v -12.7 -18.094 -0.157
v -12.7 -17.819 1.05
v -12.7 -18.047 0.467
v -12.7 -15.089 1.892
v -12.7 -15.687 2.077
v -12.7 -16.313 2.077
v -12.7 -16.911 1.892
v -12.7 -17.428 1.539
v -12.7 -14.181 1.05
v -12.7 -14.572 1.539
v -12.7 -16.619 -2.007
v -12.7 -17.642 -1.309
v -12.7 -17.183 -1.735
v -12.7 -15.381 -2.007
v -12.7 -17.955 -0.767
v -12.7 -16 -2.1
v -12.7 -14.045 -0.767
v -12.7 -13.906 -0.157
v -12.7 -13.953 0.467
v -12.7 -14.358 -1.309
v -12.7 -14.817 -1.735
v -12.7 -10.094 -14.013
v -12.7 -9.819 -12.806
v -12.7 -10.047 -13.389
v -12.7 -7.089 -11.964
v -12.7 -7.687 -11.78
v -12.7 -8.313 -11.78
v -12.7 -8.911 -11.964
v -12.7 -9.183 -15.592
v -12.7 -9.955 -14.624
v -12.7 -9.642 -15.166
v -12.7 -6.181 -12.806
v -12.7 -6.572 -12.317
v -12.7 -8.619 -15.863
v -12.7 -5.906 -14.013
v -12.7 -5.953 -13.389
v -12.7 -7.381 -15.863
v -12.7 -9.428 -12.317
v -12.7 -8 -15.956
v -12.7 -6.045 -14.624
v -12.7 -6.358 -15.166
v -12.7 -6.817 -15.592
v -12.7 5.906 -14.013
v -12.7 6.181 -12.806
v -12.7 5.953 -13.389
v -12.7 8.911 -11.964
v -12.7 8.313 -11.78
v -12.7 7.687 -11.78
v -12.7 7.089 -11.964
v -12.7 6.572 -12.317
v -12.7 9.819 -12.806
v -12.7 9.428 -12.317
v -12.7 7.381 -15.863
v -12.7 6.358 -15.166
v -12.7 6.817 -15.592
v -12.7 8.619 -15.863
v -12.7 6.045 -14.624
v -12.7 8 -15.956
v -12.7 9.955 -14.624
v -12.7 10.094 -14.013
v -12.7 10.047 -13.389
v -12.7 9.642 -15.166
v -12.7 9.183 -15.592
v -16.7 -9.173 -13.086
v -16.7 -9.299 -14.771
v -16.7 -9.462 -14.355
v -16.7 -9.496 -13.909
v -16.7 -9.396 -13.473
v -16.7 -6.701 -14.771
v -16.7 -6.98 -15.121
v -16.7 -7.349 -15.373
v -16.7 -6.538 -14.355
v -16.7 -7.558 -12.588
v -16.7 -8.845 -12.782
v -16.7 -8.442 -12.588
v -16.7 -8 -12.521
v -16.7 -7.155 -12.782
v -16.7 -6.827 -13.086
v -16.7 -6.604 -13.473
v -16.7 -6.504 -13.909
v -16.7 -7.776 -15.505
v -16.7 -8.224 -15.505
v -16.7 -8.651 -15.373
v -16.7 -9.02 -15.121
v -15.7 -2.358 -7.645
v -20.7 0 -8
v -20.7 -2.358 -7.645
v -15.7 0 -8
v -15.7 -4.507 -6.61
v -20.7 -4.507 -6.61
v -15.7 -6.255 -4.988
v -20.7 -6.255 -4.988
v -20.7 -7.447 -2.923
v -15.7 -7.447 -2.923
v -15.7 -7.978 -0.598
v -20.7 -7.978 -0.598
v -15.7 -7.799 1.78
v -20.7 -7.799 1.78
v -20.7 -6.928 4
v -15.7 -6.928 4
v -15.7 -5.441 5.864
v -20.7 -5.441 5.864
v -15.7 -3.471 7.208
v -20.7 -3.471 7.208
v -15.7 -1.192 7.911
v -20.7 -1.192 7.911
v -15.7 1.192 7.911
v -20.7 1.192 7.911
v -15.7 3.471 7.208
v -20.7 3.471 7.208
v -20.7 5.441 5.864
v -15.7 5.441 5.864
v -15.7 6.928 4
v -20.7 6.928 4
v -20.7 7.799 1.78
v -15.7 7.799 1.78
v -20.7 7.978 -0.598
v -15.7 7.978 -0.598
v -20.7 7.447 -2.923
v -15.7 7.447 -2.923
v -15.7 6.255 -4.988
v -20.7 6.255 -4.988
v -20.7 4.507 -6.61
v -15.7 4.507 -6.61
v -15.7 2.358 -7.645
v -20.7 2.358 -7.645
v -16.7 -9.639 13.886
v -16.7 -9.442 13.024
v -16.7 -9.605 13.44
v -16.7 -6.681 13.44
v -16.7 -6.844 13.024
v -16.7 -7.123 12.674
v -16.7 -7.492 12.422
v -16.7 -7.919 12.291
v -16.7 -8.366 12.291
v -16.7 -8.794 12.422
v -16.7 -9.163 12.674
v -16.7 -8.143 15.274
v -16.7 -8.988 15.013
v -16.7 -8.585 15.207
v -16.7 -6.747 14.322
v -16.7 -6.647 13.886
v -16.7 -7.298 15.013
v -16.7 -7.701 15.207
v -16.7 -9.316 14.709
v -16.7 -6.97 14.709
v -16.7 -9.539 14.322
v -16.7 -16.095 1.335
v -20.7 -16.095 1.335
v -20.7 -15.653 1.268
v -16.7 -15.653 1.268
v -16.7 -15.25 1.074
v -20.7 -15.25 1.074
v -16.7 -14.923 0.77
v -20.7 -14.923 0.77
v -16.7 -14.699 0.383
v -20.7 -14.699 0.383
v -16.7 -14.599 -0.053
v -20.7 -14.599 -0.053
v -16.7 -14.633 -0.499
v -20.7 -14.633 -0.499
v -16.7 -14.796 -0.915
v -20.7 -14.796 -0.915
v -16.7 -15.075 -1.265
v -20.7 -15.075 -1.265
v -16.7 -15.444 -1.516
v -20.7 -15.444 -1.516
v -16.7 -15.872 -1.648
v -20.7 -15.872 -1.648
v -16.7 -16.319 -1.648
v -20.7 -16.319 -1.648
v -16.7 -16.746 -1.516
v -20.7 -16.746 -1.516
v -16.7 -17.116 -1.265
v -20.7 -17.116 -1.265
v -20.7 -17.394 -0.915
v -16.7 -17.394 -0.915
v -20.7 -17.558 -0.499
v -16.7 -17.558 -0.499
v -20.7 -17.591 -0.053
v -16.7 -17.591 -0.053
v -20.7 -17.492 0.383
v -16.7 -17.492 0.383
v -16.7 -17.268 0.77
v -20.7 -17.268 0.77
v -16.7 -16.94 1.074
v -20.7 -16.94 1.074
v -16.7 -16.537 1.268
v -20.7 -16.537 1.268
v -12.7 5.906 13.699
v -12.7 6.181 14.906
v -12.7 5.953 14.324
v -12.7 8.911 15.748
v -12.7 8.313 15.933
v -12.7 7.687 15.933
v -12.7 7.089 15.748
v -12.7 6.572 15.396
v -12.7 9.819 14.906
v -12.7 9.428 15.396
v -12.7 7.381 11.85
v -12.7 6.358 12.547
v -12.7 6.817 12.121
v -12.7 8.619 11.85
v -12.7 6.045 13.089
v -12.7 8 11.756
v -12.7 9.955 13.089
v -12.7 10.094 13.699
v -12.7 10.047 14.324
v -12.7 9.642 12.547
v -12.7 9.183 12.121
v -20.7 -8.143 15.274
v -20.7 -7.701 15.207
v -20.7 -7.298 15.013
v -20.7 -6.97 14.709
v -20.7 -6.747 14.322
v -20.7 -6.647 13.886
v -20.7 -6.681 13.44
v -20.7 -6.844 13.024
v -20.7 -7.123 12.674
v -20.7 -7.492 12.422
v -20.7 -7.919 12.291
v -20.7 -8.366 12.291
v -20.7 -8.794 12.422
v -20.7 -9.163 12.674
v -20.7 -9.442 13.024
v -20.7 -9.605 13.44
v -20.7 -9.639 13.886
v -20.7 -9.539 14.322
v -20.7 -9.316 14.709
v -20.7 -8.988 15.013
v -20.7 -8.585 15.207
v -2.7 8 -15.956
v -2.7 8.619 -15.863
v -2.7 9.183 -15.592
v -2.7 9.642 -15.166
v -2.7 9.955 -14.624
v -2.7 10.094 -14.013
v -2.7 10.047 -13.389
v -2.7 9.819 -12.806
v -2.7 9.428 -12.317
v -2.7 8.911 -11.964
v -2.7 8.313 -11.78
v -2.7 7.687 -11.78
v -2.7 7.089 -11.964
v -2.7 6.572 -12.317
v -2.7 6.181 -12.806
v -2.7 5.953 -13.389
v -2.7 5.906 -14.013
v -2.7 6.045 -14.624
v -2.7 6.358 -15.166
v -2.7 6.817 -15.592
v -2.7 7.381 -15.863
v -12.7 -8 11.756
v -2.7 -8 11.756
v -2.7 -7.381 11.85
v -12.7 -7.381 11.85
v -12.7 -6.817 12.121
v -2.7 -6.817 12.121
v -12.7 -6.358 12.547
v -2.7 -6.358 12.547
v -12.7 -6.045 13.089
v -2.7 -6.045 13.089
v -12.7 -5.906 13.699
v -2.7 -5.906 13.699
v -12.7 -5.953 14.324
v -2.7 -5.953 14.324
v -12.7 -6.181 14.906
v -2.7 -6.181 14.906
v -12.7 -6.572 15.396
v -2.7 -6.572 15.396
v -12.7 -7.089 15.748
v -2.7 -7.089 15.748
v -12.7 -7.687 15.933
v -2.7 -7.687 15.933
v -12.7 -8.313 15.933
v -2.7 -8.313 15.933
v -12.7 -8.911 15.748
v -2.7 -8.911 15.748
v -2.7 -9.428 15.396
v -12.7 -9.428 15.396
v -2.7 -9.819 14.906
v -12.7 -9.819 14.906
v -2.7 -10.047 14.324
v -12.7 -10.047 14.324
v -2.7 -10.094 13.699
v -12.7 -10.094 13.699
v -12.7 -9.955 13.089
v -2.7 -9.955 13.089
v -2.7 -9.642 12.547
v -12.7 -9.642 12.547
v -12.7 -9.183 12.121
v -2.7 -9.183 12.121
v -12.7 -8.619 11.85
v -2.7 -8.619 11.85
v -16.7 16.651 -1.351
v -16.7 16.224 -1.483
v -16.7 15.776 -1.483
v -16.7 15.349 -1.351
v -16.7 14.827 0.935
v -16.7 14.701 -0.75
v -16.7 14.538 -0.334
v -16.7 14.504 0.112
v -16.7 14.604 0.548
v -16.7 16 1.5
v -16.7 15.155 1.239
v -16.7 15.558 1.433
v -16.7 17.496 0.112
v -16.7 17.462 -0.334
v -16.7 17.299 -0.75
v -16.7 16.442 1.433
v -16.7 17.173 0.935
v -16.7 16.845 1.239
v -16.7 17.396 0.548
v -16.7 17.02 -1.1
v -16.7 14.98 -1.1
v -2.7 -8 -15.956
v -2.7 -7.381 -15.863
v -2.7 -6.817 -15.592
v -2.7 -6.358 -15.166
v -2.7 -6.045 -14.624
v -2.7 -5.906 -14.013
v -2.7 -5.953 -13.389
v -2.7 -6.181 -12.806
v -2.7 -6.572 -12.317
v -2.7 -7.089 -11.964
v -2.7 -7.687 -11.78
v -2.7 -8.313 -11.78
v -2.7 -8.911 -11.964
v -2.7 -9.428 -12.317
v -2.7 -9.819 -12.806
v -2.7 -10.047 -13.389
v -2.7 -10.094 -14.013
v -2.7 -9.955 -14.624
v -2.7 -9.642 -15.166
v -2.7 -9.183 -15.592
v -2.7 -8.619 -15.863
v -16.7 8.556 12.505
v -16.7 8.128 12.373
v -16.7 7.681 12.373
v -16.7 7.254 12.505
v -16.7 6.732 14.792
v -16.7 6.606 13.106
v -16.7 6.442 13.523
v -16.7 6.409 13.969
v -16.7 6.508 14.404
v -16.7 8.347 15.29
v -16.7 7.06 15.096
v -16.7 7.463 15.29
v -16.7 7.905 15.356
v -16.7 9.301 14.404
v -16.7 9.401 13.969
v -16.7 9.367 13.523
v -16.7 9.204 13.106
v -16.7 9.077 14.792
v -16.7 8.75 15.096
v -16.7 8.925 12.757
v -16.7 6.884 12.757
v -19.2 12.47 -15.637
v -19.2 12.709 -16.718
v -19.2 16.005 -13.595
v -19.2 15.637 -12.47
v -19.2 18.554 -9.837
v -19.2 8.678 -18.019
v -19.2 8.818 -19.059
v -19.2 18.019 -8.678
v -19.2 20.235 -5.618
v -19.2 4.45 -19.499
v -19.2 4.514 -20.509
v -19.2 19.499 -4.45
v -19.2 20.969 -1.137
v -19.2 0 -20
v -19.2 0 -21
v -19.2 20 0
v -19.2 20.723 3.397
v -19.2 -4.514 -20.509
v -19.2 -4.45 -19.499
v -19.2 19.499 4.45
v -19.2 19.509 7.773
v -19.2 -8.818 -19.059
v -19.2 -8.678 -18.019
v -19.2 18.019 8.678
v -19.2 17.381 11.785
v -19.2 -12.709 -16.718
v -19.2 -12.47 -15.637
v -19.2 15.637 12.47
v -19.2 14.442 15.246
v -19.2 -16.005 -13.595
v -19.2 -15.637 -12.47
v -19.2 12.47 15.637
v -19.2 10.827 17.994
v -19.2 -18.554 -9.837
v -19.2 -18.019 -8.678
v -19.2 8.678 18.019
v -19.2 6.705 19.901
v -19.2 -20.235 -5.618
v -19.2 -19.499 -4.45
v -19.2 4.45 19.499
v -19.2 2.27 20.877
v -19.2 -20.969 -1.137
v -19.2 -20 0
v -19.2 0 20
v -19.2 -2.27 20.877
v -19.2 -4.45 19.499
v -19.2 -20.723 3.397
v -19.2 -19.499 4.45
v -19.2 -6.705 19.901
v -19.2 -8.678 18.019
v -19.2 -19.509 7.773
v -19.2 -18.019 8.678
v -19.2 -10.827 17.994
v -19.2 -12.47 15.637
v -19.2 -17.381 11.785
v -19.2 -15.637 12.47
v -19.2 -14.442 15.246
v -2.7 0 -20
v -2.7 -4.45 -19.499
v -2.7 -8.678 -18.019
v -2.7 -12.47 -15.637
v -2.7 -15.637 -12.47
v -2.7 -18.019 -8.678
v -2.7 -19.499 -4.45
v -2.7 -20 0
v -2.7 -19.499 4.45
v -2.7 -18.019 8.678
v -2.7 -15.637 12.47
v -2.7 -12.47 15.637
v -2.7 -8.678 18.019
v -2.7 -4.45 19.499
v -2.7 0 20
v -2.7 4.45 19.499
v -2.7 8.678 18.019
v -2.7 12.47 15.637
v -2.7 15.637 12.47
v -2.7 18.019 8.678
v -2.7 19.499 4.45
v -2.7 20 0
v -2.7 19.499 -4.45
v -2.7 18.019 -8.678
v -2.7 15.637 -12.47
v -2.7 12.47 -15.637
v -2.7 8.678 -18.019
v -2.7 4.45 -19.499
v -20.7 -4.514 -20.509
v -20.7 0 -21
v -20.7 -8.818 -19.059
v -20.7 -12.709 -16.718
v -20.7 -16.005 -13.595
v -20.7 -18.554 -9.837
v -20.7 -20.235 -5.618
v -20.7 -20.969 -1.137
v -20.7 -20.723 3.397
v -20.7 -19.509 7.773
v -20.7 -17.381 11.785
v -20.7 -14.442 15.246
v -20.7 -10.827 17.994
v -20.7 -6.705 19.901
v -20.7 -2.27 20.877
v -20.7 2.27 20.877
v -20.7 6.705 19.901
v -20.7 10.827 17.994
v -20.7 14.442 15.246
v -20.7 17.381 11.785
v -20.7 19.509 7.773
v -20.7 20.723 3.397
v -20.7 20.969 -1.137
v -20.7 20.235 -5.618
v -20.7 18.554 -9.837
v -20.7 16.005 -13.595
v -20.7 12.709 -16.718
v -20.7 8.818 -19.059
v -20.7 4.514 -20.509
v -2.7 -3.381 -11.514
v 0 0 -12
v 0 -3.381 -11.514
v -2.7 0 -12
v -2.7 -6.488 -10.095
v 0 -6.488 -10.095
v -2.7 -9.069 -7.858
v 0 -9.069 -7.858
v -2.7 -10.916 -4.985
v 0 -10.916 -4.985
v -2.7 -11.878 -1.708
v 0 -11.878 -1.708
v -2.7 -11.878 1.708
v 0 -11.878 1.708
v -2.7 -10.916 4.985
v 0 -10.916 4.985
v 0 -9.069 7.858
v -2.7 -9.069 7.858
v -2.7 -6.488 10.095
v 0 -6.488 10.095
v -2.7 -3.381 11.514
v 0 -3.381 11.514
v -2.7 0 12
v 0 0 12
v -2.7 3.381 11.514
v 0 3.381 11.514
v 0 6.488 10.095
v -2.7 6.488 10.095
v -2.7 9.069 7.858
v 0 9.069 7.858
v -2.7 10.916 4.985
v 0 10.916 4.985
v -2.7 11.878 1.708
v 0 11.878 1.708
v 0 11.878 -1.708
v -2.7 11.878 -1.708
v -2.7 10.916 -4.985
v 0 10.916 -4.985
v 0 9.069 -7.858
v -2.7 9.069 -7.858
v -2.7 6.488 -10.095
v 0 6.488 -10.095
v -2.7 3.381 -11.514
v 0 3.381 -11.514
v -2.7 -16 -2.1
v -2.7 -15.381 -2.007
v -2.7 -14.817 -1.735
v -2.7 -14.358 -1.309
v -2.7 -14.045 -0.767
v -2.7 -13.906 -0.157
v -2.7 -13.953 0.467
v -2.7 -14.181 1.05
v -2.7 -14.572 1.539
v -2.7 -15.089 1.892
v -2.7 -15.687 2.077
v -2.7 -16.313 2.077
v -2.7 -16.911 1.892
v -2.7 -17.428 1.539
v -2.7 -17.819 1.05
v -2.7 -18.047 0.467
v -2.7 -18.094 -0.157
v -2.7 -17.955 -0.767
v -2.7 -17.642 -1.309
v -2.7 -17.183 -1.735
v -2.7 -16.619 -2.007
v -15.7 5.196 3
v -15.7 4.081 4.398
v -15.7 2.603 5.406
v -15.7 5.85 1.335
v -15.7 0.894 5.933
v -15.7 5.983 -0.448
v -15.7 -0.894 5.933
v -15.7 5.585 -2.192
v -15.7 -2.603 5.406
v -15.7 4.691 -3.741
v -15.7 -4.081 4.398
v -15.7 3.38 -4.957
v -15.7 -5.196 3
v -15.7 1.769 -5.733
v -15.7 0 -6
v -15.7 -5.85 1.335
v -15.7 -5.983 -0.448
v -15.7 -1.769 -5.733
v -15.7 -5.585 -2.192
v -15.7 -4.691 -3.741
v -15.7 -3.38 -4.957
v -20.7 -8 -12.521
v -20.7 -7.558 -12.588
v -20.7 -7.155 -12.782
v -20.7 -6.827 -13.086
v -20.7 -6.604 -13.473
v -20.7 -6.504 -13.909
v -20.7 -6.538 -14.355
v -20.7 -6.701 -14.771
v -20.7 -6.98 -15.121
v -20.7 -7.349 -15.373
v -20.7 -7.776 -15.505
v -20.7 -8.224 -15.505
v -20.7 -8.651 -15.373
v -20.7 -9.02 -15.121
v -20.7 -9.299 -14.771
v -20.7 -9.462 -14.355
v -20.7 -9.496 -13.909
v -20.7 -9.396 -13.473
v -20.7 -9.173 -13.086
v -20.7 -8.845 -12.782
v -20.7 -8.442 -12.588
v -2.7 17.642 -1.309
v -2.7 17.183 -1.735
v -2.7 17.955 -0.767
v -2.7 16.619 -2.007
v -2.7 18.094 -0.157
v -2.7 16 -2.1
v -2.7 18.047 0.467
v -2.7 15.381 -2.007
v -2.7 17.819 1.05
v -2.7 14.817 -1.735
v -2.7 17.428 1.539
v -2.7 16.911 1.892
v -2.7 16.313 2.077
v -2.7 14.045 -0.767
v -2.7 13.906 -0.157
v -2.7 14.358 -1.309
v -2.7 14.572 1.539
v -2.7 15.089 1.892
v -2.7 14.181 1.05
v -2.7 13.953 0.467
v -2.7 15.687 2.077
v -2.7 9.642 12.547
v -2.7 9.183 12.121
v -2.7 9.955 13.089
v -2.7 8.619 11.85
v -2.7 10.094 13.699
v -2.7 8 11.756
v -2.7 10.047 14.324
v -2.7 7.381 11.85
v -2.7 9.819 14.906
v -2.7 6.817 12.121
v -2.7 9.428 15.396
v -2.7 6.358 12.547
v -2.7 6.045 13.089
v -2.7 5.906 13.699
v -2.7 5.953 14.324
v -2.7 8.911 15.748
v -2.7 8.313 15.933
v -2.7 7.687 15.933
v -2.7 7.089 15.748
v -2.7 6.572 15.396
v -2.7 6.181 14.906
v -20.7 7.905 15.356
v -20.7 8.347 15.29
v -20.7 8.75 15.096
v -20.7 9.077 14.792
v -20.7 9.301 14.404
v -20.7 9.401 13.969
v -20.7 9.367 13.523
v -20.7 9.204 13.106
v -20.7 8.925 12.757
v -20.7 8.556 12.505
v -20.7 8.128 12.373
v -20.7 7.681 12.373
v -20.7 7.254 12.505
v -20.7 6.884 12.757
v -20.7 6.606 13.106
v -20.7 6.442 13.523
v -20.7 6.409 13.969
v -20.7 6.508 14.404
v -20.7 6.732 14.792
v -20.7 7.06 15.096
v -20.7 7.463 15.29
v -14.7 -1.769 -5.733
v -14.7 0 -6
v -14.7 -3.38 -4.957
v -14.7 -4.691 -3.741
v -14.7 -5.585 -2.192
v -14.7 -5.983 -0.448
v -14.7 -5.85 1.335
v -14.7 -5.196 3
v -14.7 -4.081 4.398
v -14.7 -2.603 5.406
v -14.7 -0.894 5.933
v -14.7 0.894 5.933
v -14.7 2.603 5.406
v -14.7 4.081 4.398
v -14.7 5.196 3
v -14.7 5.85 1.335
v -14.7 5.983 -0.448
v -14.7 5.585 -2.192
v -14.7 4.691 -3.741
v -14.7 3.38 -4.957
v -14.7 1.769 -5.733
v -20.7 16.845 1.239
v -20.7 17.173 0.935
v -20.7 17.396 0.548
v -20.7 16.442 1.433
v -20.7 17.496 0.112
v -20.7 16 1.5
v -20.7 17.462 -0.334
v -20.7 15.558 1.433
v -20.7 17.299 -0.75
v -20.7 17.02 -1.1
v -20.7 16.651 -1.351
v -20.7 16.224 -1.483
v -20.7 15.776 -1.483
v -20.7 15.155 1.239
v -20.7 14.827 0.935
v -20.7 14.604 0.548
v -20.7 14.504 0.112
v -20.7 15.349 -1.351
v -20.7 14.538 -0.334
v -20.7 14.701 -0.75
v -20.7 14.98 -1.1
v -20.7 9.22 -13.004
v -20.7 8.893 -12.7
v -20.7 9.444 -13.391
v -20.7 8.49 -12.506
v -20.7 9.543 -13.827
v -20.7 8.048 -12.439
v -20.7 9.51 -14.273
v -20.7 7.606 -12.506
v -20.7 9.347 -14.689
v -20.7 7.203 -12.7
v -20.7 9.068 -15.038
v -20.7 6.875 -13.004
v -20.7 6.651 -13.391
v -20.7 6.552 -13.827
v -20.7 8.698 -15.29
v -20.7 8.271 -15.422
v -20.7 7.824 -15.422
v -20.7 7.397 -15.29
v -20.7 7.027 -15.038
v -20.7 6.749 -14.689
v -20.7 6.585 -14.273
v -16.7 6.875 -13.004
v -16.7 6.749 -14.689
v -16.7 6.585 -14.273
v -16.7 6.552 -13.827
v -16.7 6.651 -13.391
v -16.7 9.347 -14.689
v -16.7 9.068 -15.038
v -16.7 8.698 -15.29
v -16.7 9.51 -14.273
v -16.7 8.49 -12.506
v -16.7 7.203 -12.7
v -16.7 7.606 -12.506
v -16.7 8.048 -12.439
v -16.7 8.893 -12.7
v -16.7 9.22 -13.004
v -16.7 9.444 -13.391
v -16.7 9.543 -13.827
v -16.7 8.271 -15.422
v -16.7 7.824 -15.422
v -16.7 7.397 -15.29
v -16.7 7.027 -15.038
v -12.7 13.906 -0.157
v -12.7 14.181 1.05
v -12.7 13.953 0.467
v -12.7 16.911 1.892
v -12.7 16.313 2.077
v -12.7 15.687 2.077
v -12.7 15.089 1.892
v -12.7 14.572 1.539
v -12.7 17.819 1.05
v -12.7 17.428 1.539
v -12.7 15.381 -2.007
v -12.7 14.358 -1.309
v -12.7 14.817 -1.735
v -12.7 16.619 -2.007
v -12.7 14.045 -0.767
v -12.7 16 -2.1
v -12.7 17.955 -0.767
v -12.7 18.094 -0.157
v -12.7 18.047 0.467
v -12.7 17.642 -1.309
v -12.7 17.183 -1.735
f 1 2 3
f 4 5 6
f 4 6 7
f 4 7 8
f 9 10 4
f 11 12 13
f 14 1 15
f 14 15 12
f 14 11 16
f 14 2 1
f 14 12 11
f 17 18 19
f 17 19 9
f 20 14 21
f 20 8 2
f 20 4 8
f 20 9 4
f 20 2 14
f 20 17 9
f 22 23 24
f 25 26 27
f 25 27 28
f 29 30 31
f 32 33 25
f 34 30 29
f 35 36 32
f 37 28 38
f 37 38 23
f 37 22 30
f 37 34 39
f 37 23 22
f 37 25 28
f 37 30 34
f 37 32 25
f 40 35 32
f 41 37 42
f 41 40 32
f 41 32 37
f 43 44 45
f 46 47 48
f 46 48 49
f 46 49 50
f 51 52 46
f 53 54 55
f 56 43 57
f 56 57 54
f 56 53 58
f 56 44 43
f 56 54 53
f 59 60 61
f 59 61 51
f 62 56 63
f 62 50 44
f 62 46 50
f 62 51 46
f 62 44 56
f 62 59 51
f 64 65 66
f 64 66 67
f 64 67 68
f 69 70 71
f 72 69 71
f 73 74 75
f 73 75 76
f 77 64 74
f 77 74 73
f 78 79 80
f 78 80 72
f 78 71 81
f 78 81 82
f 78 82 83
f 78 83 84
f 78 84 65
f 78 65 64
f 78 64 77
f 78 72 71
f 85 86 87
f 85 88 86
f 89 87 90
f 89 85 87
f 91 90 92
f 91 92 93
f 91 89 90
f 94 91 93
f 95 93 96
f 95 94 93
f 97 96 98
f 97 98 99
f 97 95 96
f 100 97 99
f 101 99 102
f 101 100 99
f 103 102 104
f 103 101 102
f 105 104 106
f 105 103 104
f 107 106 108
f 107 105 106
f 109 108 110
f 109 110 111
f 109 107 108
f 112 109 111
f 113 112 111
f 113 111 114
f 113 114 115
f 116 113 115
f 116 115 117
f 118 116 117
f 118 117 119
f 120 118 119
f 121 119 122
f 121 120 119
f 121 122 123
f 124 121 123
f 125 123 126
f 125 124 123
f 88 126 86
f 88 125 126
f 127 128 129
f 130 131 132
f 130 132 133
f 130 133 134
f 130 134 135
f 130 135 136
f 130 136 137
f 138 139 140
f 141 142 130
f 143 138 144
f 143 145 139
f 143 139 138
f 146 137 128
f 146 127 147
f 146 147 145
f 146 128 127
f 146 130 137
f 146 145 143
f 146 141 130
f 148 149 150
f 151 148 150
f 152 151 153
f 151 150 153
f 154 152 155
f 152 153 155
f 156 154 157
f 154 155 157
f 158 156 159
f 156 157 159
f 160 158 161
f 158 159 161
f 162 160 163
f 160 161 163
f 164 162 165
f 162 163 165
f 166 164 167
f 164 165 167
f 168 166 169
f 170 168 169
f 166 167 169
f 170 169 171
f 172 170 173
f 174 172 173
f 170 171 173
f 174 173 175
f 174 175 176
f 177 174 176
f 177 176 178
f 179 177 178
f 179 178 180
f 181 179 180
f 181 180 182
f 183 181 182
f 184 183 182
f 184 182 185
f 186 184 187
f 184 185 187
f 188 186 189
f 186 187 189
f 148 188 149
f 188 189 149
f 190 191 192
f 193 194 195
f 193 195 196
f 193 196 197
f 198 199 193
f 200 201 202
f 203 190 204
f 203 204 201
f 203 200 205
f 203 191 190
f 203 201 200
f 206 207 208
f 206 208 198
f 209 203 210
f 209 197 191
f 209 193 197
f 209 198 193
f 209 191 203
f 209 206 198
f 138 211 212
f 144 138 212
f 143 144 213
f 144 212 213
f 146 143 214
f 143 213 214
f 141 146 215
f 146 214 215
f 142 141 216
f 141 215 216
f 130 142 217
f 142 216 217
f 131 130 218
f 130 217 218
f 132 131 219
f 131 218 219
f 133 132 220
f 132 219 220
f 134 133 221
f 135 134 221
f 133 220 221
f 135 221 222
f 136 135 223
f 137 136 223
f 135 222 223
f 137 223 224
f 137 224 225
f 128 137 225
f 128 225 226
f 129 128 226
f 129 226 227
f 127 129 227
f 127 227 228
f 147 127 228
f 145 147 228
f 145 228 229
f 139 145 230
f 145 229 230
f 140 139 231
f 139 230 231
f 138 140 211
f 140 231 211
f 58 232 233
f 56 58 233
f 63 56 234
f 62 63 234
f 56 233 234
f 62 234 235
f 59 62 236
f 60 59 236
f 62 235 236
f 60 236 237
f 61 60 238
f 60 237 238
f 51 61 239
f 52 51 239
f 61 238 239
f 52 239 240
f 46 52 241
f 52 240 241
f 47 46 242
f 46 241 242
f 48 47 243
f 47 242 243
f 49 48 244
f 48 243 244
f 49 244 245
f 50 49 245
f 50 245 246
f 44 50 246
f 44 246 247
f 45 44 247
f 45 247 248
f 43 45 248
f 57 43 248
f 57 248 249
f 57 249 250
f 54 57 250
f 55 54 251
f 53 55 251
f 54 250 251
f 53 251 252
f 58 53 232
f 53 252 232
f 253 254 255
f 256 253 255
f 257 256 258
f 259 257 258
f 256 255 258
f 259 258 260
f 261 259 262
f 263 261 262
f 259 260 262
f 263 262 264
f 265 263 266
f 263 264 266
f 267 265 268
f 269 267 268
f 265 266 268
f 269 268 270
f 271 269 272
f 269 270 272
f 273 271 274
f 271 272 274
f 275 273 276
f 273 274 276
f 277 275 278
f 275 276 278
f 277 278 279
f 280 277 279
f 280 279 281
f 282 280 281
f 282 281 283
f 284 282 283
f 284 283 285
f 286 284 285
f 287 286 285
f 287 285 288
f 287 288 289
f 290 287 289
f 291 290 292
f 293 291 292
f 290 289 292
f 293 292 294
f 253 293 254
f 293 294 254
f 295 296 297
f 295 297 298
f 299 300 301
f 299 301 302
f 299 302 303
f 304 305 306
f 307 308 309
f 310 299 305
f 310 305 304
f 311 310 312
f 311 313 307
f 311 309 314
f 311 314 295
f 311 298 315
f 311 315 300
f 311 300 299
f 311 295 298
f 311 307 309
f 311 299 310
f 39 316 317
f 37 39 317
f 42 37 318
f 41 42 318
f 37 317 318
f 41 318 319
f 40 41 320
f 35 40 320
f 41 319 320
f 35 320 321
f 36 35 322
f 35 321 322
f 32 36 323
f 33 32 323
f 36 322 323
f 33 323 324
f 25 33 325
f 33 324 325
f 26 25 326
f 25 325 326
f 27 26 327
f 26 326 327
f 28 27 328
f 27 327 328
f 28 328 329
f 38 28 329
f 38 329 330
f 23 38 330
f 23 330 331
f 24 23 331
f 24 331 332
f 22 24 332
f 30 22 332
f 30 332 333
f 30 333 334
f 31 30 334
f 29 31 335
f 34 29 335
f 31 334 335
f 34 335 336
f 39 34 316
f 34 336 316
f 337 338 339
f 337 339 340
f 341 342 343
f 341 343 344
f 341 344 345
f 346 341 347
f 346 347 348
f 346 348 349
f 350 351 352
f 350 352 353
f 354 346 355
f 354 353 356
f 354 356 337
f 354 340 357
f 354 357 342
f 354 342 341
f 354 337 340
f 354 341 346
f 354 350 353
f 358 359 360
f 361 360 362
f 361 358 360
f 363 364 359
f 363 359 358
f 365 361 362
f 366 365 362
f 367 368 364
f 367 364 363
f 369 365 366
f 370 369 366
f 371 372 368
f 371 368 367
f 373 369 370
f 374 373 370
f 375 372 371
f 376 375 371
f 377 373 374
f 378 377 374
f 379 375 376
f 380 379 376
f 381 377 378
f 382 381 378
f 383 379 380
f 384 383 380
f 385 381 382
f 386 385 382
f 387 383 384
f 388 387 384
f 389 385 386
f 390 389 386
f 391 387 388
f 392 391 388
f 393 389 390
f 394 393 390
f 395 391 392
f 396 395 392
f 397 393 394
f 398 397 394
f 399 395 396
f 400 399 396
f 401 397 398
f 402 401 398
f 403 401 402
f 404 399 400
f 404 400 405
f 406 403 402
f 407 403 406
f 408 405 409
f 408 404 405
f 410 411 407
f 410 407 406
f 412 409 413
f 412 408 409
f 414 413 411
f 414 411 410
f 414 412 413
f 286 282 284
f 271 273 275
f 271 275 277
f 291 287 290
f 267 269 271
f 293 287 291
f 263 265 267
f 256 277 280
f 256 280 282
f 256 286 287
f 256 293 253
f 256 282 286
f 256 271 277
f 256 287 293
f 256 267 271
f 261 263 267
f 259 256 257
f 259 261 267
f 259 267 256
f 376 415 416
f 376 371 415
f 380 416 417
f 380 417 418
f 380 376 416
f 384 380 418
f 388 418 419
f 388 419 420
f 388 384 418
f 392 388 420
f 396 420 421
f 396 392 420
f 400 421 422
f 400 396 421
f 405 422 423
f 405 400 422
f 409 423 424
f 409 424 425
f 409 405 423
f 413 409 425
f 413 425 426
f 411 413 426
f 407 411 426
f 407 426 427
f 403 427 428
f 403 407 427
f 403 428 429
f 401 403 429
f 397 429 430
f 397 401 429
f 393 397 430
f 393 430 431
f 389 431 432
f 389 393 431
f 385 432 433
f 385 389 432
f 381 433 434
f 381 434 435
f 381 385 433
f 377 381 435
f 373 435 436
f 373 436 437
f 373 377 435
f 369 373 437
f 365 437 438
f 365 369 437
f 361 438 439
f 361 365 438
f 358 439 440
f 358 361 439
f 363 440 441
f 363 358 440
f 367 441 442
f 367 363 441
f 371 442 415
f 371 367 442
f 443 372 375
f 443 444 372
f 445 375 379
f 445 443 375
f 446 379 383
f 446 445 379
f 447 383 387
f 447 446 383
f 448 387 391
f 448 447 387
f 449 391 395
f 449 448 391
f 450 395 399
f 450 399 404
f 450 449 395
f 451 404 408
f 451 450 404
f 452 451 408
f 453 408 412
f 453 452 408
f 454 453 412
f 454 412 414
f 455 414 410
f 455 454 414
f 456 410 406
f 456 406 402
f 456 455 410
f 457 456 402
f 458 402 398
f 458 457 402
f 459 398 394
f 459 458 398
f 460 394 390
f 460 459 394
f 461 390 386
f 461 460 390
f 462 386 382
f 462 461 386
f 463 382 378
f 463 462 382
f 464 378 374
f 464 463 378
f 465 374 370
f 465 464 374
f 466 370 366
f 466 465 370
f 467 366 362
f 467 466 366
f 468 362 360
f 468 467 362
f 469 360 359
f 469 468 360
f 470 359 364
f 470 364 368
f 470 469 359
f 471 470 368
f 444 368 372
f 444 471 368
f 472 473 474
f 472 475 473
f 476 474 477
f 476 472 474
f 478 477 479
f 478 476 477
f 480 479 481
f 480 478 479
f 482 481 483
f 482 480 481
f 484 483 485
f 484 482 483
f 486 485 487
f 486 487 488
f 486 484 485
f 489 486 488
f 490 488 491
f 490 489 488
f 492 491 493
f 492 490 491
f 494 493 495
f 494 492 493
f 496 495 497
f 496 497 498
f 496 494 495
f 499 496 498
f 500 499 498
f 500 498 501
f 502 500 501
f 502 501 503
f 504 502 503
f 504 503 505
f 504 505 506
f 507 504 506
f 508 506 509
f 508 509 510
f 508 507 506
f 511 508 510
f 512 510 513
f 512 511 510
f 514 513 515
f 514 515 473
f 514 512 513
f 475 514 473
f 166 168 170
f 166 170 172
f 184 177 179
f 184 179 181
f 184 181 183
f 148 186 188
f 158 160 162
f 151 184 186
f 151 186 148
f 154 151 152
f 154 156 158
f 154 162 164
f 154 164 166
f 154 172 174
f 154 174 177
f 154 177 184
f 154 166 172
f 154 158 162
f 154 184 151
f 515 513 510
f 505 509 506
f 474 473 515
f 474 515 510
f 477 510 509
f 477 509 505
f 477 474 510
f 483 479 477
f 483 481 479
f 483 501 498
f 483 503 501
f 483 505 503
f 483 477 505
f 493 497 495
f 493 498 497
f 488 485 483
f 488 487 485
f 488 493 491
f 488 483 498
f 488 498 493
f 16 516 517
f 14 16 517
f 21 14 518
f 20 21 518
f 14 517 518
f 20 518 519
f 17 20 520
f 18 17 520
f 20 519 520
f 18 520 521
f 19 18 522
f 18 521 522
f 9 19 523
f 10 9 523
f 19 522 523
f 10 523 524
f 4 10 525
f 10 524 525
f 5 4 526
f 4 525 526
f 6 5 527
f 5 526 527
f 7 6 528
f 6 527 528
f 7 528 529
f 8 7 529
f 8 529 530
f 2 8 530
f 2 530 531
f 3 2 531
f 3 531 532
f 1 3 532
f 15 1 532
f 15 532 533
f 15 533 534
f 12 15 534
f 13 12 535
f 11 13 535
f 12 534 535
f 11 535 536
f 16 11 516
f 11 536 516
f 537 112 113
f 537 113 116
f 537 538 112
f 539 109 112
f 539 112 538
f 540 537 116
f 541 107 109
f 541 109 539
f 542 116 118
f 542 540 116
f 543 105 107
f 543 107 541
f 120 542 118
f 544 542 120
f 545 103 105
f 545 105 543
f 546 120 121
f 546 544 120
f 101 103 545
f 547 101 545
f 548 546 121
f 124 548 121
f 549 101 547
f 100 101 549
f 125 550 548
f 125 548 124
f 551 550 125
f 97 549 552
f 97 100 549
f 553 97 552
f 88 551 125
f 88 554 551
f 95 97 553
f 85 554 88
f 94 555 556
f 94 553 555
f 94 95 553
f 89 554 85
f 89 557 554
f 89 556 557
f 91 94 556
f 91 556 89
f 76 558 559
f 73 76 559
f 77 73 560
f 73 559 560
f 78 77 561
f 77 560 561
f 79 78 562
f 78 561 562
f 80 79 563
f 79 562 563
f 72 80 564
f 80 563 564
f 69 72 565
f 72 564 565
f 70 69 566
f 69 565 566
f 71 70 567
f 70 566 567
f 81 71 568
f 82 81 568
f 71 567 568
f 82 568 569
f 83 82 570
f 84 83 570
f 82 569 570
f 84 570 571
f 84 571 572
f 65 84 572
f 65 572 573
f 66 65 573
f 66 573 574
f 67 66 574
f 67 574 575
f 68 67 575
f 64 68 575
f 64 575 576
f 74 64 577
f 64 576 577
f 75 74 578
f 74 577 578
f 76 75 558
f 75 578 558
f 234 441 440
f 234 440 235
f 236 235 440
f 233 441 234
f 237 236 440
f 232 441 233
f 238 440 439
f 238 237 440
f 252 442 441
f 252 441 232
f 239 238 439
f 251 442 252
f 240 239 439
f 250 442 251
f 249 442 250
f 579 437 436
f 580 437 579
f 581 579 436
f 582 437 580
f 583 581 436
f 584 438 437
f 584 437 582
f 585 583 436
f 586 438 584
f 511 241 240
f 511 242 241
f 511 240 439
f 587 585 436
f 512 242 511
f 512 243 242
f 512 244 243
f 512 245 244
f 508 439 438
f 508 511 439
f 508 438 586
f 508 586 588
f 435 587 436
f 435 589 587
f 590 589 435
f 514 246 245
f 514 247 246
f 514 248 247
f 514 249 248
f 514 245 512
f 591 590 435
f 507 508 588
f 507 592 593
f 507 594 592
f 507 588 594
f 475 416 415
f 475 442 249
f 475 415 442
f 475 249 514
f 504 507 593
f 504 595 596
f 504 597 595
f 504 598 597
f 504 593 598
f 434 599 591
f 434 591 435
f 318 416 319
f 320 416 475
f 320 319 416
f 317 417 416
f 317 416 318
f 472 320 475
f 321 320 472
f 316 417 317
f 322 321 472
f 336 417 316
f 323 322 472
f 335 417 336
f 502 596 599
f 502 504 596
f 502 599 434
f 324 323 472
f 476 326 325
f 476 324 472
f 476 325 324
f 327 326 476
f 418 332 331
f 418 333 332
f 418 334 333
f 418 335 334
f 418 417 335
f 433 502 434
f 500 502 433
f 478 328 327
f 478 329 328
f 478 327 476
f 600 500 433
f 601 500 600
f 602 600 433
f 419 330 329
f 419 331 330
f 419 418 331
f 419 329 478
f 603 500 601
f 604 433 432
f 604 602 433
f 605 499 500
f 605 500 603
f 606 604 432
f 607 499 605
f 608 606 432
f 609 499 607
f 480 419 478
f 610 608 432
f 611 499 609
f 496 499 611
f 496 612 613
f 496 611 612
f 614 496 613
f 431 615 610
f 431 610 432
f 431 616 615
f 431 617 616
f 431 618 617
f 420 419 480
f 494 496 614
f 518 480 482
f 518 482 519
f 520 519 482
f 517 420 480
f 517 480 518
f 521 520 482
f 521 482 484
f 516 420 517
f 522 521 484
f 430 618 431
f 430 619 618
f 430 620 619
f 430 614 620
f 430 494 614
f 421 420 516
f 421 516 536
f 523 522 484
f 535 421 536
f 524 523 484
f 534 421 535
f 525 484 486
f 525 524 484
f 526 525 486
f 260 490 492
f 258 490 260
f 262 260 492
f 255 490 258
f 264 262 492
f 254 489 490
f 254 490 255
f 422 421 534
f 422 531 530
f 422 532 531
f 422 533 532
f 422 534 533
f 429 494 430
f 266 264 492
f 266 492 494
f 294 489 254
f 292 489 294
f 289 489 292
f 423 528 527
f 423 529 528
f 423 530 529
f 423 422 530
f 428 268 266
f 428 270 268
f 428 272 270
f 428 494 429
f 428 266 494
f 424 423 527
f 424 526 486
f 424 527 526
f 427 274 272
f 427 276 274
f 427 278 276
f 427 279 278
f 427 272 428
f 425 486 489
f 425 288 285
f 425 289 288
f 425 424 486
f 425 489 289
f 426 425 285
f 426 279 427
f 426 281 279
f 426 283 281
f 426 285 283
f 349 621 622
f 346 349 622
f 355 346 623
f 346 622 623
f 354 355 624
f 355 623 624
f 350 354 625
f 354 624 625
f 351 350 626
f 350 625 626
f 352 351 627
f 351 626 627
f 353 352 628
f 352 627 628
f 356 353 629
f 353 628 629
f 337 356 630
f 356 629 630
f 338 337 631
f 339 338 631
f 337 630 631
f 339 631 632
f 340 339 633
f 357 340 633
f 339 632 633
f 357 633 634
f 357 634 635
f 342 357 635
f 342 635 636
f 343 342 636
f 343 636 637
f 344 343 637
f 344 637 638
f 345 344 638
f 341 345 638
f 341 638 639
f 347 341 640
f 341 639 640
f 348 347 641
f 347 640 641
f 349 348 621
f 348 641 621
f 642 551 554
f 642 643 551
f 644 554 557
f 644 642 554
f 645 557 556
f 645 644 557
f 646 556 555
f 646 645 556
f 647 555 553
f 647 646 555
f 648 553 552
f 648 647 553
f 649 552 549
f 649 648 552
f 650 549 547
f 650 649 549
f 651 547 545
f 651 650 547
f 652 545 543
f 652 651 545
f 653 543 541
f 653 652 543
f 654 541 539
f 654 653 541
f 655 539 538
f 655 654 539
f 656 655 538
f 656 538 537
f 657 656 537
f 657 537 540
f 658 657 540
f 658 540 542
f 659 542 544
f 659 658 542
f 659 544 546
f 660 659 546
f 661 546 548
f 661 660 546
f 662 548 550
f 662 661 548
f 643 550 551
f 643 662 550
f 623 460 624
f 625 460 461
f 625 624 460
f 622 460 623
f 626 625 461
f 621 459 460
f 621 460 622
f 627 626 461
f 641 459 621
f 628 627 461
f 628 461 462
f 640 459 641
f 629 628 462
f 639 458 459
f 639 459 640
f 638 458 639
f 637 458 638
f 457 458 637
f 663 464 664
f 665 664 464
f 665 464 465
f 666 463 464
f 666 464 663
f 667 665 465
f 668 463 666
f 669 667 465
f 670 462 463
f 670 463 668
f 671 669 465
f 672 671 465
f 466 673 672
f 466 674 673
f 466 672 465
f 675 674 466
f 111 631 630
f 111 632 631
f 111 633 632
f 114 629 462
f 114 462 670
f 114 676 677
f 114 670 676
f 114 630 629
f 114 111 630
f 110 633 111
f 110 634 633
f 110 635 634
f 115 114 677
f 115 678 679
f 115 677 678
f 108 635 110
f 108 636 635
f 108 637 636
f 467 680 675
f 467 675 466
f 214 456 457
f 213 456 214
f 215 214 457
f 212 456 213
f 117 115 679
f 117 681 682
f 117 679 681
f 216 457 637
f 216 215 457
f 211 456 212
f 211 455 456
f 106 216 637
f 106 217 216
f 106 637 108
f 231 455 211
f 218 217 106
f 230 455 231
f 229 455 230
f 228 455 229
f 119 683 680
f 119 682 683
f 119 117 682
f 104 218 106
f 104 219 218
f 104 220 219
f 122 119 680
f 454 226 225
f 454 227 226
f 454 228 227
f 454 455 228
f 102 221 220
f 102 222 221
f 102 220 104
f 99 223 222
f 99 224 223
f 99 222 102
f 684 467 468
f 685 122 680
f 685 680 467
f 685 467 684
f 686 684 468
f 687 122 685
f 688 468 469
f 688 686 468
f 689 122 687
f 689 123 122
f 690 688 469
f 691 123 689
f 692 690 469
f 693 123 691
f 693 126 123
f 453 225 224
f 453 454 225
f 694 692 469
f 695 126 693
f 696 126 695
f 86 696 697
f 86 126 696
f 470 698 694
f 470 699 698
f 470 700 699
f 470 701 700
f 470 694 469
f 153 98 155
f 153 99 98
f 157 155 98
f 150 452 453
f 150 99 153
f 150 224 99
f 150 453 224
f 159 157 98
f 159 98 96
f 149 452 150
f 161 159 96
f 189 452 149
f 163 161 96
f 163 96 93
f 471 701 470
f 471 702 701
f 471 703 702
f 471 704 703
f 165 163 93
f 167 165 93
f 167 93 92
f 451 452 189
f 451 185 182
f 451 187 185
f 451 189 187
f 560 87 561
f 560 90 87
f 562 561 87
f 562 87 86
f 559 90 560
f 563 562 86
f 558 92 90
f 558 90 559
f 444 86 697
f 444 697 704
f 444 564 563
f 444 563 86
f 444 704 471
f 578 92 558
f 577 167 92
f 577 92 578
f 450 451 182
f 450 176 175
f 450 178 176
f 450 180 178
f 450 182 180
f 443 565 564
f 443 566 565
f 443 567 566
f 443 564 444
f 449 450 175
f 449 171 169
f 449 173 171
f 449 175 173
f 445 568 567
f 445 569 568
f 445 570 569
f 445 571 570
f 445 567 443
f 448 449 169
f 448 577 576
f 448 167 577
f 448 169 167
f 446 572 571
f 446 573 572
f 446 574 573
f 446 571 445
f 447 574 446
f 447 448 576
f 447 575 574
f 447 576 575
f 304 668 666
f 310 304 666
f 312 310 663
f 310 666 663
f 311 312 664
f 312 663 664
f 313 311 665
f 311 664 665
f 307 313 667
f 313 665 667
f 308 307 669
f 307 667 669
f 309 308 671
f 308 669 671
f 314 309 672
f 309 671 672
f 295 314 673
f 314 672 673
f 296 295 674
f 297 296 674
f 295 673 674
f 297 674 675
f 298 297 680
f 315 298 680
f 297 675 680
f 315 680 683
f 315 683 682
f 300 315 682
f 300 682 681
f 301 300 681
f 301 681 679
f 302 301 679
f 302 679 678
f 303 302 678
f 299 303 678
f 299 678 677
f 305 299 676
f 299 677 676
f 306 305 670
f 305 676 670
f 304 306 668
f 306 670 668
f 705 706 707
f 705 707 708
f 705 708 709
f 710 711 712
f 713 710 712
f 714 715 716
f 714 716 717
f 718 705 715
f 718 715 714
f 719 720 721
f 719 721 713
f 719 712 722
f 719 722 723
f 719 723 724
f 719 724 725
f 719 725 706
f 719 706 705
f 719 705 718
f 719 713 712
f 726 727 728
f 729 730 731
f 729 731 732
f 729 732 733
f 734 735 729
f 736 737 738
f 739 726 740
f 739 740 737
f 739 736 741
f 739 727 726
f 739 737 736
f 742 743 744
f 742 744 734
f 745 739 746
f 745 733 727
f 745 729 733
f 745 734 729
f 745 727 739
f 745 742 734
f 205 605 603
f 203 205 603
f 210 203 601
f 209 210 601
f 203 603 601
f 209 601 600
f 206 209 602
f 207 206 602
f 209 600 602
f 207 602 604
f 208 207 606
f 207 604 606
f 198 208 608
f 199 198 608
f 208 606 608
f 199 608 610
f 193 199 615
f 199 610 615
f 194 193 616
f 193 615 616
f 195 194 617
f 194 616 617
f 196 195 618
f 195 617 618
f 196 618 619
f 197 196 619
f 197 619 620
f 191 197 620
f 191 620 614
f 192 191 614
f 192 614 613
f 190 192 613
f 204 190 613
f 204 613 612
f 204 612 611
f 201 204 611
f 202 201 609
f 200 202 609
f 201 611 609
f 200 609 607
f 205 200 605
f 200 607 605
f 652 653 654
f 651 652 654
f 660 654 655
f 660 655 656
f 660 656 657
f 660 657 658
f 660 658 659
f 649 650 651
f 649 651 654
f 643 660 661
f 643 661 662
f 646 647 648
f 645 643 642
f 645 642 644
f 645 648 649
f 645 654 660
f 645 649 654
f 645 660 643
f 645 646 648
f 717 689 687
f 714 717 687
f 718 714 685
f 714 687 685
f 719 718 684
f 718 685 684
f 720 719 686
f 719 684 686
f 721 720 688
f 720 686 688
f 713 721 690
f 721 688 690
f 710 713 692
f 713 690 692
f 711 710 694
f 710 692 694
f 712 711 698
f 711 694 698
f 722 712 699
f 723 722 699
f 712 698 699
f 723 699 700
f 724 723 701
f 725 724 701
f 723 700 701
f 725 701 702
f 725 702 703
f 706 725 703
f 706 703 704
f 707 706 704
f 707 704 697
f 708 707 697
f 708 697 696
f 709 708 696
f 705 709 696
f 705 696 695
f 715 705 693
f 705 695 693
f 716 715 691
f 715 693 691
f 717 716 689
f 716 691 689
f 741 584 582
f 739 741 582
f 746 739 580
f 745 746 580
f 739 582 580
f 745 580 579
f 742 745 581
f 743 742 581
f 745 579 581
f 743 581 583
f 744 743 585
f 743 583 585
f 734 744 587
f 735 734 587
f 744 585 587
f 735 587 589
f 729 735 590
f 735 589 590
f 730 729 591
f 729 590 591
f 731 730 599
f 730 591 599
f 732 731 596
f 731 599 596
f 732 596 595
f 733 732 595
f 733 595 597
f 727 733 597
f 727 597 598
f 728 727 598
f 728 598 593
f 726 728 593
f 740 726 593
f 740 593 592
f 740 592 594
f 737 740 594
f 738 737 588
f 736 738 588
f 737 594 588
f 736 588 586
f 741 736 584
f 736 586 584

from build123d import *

# Parameters (mm, degrees)
SKETCH3_R          = 1.5
CUT_EXTRUDE1_DEPTH = 4
SKETCH4_R          = 2.1
CUT_EXTRUDE2_DEPTH = 10


with BuildPart() as part:
    # Sketch2 → Revolve1 (revolve)
    with BuildSketch(Plane(origin=(0, 0, 0), x_dir=(1, 0, 0), z_dir=(0, 1, 0))):
        Polygon((0, 0), (0, 12), (-2.7, 12), (-2.7, 20), (-19.2, 20), (-19.2, 21), (-20.7, 21), (-20.7, 17.652837292), (-20.7, 14.5), (-20.7, 8), (-15.7, 8), (-15.7, 6), (-14.7, 6), (-14.7, 0), align=None)
    revolve(axis=Axis((0, 0, 0), (-1, 0, 0)))

    # Sketch3 → Cut-Extrude1 (cut)
    with BuildSketch(Plane.ZY.offset(20.7)):
        with Locations((0, 16)):
            Circle(SKETCH3_R)
        with Locations((13.856406461, 7.904729806)):
            Circle(SKETCH3_R)
        with Locations((13.773900052, -8.142905292)):
            Circle(SKETCH3_R)
        with Locations((-0.165012817, -16.095270194)):
            Circle(SKETCH3_R)
        with Locations((-14.021419278, -8)):
            Circle(SKETCH3_R)
        with Locations((-13.938912869, 8.047635097)):
            Circle(SKETCH3_R)
    extrude(amount=-CUT_EXTRUDE1_DEPTH, mode=Mode.SUBTRACT)

    # Sketch4 → Cut-Extrude2 (cut)
    with BuildSketch(Plane(origin=(-2.7, 0, 0), x_dir=(0, 0, -1), z_dir=(1, 0, 0))):
        with Locations((0, 16)):
            Circle(SKETCH4_R)
        with Locations((13.856406461, 8)):
            Circle(SKETCH4_R)
        with Locations((13.856406461, -8)):
            Circle(SKETCH4_R)
        with Locations((0, -16)):
            Circle(SKETCH4_R)
        with Locations((-13.856406461, -8)):
            Circle(SKETCH4_R)
        with Locations((-13.856406461, 8)):
            Circle(SKETCH4_R)
    extrude(amount=-CUT_EXTRUDE2_DEPTH, mode=Mode.SUBTRACT)


solid = part.part
